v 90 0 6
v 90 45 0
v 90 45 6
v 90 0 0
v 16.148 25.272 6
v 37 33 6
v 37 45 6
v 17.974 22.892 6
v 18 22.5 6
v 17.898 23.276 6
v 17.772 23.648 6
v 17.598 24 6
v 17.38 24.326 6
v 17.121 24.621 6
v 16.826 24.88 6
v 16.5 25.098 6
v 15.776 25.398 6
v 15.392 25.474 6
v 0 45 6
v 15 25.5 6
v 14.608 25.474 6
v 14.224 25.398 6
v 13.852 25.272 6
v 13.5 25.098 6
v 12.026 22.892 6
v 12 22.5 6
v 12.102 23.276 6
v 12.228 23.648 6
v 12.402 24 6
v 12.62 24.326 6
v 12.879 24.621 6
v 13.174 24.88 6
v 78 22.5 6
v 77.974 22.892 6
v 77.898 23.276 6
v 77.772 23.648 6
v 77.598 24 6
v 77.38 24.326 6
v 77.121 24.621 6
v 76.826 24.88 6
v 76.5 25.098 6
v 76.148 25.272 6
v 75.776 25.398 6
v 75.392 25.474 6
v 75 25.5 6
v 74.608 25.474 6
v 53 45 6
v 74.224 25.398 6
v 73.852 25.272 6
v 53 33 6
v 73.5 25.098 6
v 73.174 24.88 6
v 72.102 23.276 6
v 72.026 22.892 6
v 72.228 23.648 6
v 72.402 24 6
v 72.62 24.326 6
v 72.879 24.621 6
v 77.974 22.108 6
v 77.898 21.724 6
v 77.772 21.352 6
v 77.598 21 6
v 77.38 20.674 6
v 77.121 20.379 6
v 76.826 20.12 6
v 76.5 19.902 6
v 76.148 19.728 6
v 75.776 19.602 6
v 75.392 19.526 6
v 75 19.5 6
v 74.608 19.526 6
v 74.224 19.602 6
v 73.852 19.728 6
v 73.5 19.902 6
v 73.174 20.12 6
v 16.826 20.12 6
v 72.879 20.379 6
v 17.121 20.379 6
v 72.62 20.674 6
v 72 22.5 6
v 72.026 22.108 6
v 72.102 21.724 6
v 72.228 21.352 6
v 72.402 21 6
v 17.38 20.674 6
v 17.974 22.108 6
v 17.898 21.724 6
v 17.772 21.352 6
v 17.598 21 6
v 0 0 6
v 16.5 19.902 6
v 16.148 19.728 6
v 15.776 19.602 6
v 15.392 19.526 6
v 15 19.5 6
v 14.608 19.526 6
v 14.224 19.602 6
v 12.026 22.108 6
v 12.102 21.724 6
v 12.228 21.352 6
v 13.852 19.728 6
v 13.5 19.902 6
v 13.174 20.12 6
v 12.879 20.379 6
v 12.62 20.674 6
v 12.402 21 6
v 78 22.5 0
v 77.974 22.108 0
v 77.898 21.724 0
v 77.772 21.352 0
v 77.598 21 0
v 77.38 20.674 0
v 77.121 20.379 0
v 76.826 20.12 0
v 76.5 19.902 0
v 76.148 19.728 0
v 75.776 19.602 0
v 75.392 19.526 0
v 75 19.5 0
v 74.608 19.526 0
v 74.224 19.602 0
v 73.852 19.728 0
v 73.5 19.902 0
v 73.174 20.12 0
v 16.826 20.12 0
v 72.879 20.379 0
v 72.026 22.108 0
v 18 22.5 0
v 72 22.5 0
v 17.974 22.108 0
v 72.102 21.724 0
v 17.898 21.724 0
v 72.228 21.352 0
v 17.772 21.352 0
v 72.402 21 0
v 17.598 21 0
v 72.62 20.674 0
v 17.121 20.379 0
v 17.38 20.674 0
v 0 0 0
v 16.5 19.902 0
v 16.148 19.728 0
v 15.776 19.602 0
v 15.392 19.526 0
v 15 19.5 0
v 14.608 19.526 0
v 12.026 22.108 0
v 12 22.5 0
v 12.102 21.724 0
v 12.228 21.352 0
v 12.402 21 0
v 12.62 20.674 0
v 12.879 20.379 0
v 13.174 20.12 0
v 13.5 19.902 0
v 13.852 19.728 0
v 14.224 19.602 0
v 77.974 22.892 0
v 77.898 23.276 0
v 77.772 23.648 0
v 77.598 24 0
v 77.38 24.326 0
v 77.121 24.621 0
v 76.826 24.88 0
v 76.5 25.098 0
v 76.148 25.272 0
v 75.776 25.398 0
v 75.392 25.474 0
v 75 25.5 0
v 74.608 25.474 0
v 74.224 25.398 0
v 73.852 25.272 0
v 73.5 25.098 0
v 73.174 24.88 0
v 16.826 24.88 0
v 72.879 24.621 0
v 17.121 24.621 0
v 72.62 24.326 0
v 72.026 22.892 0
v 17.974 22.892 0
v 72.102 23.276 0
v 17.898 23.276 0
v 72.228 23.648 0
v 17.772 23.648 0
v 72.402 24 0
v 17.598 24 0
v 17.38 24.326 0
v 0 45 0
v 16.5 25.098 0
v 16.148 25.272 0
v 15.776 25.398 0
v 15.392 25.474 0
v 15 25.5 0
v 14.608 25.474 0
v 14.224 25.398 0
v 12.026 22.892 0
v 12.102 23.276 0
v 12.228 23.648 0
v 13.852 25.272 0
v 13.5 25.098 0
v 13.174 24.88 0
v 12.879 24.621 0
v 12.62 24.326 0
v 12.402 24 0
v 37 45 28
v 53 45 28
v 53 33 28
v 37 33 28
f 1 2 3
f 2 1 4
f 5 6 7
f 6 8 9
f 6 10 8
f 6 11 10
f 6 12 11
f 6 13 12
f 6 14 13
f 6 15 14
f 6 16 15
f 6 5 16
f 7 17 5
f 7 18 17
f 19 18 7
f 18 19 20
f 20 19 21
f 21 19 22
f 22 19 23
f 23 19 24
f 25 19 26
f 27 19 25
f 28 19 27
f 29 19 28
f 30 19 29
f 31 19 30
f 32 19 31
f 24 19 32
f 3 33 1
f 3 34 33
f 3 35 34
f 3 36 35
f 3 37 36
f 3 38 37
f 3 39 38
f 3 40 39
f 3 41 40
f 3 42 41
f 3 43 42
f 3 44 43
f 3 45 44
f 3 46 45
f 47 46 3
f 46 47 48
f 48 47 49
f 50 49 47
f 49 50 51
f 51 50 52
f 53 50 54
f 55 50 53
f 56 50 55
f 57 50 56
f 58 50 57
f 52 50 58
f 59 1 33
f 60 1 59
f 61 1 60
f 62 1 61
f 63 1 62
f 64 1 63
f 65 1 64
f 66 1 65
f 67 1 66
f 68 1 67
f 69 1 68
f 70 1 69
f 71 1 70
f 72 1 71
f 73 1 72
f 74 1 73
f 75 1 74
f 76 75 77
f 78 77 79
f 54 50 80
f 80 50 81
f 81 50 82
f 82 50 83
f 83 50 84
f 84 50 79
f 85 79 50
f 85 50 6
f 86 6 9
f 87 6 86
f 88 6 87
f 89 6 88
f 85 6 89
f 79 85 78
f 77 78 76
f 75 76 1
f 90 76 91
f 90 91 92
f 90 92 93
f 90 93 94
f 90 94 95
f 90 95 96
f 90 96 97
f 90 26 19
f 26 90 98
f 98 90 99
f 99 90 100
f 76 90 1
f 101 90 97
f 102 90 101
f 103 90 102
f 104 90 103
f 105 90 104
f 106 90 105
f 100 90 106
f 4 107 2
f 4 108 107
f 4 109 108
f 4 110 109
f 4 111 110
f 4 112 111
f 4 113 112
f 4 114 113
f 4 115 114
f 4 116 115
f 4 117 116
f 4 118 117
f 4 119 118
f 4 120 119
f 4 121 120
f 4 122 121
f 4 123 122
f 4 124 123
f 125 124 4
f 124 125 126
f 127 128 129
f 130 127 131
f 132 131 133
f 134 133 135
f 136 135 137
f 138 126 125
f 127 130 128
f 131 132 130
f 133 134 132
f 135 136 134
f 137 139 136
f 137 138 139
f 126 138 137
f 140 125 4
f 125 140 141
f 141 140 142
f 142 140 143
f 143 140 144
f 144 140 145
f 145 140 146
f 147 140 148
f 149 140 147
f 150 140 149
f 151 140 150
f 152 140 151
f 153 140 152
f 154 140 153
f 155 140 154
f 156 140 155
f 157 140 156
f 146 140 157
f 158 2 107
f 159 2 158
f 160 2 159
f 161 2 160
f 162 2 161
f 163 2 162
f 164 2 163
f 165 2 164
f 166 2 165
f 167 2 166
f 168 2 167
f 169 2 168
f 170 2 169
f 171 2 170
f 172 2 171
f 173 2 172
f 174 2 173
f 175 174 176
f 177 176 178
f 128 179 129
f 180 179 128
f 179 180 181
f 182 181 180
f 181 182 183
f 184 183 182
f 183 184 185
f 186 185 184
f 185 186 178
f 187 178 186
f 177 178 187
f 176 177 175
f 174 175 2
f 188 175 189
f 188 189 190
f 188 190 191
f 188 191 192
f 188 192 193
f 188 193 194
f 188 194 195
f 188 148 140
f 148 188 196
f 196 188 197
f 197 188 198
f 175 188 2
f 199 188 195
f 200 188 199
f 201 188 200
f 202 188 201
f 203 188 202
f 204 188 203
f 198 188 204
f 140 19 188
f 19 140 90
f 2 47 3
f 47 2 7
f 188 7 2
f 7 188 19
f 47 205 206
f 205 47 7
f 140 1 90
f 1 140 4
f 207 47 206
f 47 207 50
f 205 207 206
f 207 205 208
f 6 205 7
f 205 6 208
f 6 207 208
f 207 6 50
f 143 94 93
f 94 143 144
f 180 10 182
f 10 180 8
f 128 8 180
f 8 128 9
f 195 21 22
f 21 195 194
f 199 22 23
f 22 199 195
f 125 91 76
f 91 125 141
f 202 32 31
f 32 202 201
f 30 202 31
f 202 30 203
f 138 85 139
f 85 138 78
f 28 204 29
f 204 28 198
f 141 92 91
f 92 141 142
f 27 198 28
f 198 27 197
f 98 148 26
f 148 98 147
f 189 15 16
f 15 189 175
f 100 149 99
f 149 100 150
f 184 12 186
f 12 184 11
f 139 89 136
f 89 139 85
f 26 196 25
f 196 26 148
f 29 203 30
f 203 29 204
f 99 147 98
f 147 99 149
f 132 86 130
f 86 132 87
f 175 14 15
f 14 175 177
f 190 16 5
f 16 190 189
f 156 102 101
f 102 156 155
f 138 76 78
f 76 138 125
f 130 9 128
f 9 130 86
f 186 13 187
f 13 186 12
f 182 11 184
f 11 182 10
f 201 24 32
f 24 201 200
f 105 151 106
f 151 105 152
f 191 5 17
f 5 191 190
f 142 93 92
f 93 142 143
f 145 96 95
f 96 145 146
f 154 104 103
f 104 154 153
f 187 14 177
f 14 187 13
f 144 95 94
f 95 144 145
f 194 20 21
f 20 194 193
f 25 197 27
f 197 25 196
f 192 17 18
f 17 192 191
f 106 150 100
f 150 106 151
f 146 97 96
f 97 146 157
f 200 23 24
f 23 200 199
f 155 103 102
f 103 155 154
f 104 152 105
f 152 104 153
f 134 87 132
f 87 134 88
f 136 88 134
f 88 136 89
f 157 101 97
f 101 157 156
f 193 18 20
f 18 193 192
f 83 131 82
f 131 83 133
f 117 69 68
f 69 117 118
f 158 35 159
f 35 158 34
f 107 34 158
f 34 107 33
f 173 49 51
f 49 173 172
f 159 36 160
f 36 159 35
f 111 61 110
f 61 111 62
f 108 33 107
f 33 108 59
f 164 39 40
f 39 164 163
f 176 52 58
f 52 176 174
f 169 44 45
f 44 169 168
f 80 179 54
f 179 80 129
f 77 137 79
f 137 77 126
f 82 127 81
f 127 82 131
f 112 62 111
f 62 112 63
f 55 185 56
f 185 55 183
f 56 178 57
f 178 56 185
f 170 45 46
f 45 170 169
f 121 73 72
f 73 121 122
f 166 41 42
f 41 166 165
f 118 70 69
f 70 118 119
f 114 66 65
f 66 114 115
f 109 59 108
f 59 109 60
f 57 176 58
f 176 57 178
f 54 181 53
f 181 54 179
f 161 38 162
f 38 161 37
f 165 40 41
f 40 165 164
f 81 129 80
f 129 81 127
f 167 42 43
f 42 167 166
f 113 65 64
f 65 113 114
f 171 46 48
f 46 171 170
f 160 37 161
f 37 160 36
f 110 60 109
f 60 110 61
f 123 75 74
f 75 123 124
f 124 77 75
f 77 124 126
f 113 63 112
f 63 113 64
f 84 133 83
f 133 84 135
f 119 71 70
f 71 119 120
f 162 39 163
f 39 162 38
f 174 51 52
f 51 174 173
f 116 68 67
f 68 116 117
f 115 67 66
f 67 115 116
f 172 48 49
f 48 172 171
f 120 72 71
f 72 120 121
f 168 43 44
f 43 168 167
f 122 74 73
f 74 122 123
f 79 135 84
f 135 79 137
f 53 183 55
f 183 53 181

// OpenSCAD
part_name = "monitor_mount_plate";

length = 90;
width = 45;
thickness = 6;
hole_spacing = 60;
hole_diameter = 6;
riser_height = 22;

hole_r = hole_diameter / 2;
hole_offset_x = hole_spacing / 2;
plate_center_x = length / 2;
plate_center_y = width / 2;

module monitor_mount_plate() {
difference() {
union() {
// Main plate
cube([length, width, thickness], center = false);

// Simple rear riser block for desk-mount prototype
// Adjust or replace with a true angled bracket later.
translate([plate_center_x - 8, width - 12, thickness])
cube([16, 12, riser_height], center = false);
}

// Mounting holes, centered along the length
translate([plate_center_x - hole_offset_x, plate_center_y, -1])
cylinder(h = thickness + 2, r = hole_r, $fn = 48);

translate([plate_center_x + hole_offset_x, plate_center_y, -1])
cylinder(h = thickness + 2, r = hole_r, $fn = 48);
}
}

monitor_mount_plate();
